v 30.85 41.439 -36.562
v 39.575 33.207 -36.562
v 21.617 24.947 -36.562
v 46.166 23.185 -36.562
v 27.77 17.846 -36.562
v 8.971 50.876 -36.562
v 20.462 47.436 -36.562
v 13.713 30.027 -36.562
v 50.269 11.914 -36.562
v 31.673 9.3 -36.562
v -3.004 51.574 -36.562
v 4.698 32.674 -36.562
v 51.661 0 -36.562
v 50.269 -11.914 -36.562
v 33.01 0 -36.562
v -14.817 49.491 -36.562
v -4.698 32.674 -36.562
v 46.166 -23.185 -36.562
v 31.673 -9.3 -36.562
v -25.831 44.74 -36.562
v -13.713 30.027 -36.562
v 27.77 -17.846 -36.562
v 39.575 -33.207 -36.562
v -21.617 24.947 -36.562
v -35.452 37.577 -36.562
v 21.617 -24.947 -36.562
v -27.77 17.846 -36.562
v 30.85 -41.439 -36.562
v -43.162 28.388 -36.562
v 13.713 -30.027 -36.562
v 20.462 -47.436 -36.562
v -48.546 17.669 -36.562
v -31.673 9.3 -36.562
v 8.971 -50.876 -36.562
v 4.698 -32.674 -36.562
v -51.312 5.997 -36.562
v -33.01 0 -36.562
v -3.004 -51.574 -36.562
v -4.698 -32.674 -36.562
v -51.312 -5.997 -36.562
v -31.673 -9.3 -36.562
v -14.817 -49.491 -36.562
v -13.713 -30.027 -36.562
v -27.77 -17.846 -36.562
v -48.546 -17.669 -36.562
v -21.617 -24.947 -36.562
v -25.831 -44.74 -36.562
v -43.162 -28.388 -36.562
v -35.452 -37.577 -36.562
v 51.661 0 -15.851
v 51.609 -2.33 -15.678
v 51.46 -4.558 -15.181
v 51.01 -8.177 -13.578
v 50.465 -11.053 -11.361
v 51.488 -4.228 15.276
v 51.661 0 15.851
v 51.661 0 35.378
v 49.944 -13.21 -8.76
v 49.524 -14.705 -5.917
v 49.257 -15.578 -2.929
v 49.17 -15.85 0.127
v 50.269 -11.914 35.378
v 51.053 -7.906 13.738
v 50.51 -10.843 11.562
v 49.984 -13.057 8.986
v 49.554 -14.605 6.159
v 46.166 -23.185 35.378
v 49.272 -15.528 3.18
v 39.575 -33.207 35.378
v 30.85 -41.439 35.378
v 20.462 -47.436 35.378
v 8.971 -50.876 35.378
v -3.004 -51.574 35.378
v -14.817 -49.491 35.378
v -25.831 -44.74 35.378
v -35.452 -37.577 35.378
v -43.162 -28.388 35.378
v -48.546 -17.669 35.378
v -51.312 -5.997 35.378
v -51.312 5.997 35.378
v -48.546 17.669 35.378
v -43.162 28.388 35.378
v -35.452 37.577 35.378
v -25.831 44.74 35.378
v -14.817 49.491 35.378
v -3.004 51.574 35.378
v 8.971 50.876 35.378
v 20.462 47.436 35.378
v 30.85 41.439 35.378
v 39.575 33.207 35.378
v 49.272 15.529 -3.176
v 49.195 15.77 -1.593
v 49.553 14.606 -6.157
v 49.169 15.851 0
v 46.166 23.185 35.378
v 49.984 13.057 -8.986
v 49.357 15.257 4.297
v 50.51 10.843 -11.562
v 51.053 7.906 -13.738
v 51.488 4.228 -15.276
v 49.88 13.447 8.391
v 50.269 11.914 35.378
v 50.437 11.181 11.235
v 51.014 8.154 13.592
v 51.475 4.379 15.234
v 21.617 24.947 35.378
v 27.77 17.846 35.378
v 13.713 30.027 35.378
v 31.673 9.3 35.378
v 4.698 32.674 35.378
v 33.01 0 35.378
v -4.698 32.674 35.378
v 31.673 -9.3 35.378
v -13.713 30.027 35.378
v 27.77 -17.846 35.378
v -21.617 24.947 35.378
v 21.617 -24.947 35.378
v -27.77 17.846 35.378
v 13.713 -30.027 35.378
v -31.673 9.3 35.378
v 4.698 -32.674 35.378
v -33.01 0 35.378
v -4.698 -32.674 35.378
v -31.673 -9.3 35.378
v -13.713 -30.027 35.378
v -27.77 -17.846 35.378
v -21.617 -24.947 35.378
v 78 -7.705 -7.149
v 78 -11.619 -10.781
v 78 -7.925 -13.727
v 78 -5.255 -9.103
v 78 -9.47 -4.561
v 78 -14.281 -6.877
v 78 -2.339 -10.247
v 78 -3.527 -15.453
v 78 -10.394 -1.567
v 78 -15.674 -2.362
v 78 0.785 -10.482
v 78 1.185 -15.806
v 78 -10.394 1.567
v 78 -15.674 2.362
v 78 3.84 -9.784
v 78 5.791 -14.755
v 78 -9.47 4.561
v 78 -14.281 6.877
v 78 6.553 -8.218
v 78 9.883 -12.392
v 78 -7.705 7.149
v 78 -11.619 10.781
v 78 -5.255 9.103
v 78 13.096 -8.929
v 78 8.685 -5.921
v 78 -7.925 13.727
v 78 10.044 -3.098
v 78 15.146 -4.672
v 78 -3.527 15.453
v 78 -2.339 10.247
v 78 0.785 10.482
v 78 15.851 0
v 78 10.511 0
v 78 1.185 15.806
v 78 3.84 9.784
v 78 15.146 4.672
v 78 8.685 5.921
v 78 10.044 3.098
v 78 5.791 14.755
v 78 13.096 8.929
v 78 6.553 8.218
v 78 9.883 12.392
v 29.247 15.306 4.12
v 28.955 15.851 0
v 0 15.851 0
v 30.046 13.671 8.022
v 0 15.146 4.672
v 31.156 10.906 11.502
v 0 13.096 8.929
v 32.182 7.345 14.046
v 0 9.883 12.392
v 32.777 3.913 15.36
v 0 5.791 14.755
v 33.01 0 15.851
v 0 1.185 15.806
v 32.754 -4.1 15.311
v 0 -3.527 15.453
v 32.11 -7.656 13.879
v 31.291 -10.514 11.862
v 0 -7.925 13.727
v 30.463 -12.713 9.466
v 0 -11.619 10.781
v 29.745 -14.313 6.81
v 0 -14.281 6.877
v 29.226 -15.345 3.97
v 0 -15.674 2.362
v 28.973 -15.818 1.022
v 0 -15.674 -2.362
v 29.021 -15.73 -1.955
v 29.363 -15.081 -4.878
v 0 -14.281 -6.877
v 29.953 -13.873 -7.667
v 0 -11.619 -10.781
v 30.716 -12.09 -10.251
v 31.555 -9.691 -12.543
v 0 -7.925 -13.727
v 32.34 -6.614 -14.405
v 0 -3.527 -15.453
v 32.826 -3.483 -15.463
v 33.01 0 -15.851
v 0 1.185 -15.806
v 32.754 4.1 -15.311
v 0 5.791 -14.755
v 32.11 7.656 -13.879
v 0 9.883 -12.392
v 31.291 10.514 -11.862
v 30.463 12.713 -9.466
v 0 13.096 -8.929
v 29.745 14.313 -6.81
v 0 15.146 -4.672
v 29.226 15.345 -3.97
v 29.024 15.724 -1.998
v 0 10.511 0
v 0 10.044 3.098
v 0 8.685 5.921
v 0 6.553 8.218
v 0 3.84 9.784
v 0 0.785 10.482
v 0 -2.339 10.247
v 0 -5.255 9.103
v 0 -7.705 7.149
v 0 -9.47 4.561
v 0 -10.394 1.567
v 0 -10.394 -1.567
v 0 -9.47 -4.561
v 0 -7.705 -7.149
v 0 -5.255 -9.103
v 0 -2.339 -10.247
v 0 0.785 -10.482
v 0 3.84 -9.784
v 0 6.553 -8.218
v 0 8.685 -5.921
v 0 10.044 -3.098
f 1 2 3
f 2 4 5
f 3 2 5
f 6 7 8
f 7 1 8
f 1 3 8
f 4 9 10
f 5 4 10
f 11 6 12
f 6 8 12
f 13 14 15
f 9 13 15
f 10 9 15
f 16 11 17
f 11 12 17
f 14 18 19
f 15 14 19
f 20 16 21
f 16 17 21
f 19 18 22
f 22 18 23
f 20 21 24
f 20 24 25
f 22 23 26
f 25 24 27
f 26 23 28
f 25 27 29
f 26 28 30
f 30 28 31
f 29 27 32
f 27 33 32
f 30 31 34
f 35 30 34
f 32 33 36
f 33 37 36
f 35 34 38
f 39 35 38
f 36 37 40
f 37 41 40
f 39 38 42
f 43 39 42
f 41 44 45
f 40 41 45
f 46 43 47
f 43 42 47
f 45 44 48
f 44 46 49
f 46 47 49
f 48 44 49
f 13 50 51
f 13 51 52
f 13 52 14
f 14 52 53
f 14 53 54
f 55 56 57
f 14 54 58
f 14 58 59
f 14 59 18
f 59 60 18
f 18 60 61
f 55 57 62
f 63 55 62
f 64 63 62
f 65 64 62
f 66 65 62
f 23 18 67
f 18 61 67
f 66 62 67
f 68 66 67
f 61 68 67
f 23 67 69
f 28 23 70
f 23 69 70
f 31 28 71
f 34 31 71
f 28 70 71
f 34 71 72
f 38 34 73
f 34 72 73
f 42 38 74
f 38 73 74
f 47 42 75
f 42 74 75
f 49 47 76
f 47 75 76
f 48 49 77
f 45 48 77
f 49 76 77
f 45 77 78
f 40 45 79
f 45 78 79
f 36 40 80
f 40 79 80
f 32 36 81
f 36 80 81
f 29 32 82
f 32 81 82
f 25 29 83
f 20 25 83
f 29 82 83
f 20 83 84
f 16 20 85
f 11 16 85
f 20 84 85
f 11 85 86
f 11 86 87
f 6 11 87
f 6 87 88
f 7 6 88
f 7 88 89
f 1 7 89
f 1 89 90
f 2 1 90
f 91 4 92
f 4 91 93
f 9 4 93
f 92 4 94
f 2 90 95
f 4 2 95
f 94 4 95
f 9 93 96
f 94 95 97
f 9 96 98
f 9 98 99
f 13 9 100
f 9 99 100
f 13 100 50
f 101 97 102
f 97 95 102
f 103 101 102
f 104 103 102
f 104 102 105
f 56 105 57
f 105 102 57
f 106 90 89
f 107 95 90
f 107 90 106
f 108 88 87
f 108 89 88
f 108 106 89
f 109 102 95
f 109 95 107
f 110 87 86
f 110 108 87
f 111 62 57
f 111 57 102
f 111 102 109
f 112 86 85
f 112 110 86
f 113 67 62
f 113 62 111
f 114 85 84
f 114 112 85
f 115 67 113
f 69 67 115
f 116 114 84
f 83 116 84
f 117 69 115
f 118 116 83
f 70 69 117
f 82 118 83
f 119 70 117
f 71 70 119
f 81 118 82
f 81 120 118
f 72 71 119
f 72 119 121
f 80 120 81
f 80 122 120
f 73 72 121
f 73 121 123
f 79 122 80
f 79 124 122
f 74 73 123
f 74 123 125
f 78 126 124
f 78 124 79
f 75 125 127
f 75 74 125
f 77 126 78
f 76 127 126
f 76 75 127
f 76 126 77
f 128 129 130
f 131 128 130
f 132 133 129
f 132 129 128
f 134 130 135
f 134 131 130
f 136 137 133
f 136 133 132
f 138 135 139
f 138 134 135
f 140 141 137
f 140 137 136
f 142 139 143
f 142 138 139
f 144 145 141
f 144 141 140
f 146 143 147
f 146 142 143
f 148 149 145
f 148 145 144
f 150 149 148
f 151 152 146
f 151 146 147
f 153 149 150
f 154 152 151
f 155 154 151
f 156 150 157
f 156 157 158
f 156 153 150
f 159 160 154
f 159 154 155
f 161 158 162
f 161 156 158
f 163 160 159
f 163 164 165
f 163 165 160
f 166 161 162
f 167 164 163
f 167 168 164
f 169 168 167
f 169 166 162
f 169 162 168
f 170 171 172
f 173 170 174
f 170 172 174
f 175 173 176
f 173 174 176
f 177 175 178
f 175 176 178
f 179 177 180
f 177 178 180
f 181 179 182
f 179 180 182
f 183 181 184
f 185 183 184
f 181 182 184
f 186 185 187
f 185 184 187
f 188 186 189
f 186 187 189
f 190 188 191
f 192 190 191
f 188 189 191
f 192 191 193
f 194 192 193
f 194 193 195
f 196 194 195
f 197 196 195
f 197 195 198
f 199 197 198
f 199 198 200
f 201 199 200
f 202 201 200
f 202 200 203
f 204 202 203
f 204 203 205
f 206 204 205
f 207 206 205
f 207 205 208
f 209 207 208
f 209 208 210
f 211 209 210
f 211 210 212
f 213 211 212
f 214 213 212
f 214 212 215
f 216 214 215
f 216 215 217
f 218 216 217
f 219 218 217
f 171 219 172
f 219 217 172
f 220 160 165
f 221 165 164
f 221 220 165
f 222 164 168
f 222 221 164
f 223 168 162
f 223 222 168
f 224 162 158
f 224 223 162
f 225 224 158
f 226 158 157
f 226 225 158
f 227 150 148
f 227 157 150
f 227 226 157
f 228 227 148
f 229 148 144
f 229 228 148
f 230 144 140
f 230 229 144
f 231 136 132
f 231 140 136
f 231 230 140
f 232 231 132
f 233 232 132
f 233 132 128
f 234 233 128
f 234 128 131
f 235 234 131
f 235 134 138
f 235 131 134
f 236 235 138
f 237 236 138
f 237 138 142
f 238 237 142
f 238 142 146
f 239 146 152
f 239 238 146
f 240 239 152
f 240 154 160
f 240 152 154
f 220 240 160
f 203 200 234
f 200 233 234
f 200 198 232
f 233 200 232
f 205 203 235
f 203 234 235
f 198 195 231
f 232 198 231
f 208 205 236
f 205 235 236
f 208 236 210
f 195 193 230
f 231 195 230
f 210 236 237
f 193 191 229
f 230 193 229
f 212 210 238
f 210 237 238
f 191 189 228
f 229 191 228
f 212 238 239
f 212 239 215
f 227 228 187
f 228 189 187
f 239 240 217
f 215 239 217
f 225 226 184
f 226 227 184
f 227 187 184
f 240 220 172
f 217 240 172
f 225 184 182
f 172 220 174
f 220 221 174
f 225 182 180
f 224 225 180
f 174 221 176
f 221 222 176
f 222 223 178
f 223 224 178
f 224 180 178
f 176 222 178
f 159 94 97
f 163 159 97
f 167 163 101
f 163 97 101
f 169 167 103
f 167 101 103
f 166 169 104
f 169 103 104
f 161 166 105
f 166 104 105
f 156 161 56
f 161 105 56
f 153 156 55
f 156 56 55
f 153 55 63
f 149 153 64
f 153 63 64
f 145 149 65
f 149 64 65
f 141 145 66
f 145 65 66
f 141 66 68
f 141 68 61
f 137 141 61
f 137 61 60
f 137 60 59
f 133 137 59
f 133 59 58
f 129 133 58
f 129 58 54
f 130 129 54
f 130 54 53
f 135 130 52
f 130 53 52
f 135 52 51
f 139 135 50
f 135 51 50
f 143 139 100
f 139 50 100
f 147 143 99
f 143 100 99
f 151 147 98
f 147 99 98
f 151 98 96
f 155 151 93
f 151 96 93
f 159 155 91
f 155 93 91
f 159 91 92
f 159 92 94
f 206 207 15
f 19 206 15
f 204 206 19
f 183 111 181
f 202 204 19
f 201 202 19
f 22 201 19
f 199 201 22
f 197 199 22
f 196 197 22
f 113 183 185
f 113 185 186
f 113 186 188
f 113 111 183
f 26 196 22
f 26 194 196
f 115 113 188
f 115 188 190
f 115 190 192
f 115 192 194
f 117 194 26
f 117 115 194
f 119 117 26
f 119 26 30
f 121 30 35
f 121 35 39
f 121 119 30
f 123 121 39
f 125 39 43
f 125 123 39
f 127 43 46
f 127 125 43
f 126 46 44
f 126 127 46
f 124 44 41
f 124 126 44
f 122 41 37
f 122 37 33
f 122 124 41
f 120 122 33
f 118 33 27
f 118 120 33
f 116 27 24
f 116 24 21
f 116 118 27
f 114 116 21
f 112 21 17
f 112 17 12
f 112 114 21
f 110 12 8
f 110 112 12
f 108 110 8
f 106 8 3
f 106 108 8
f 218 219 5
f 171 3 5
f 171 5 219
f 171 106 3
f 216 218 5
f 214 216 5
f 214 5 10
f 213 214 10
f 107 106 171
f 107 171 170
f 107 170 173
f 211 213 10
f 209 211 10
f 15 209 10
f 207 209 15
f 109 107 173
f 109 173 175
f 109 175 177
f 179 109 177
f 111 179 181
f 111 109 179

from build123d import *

# Parameters (mm, degrees)
F0_W     = 18.651318
F0_H     = 71.940791
F2_R     = 15.850572
F3_DEPTH = 78
F4_R     = 10.510911
F5_DEPTH = 80


with BuildPart() as f1:
    # F0 (on Front) → F1 (revolve)
    with BuildSketch(Plane.XZ):
        with Locations((42.335527, -0.592103)):
            Rectangle(F0_W, F0_H)
    revolve(axis=Axis((0, 0, 7.253291), (0, 0, -1)))

    # F2 (on Right) → F3 (join)
    with BuildSketch(Plane.YZ):
        Circle(F2_R)
    extrude(amount=F3_DEPTH)

    # F4 (on Right) → F5 (cut)
    with BuildSketch(Plane.YZ):
        Circle(F4_R)
    extrude(amount=F5_DEPTH, mode=Mode.SUBTRACT)


solid = f1.part
